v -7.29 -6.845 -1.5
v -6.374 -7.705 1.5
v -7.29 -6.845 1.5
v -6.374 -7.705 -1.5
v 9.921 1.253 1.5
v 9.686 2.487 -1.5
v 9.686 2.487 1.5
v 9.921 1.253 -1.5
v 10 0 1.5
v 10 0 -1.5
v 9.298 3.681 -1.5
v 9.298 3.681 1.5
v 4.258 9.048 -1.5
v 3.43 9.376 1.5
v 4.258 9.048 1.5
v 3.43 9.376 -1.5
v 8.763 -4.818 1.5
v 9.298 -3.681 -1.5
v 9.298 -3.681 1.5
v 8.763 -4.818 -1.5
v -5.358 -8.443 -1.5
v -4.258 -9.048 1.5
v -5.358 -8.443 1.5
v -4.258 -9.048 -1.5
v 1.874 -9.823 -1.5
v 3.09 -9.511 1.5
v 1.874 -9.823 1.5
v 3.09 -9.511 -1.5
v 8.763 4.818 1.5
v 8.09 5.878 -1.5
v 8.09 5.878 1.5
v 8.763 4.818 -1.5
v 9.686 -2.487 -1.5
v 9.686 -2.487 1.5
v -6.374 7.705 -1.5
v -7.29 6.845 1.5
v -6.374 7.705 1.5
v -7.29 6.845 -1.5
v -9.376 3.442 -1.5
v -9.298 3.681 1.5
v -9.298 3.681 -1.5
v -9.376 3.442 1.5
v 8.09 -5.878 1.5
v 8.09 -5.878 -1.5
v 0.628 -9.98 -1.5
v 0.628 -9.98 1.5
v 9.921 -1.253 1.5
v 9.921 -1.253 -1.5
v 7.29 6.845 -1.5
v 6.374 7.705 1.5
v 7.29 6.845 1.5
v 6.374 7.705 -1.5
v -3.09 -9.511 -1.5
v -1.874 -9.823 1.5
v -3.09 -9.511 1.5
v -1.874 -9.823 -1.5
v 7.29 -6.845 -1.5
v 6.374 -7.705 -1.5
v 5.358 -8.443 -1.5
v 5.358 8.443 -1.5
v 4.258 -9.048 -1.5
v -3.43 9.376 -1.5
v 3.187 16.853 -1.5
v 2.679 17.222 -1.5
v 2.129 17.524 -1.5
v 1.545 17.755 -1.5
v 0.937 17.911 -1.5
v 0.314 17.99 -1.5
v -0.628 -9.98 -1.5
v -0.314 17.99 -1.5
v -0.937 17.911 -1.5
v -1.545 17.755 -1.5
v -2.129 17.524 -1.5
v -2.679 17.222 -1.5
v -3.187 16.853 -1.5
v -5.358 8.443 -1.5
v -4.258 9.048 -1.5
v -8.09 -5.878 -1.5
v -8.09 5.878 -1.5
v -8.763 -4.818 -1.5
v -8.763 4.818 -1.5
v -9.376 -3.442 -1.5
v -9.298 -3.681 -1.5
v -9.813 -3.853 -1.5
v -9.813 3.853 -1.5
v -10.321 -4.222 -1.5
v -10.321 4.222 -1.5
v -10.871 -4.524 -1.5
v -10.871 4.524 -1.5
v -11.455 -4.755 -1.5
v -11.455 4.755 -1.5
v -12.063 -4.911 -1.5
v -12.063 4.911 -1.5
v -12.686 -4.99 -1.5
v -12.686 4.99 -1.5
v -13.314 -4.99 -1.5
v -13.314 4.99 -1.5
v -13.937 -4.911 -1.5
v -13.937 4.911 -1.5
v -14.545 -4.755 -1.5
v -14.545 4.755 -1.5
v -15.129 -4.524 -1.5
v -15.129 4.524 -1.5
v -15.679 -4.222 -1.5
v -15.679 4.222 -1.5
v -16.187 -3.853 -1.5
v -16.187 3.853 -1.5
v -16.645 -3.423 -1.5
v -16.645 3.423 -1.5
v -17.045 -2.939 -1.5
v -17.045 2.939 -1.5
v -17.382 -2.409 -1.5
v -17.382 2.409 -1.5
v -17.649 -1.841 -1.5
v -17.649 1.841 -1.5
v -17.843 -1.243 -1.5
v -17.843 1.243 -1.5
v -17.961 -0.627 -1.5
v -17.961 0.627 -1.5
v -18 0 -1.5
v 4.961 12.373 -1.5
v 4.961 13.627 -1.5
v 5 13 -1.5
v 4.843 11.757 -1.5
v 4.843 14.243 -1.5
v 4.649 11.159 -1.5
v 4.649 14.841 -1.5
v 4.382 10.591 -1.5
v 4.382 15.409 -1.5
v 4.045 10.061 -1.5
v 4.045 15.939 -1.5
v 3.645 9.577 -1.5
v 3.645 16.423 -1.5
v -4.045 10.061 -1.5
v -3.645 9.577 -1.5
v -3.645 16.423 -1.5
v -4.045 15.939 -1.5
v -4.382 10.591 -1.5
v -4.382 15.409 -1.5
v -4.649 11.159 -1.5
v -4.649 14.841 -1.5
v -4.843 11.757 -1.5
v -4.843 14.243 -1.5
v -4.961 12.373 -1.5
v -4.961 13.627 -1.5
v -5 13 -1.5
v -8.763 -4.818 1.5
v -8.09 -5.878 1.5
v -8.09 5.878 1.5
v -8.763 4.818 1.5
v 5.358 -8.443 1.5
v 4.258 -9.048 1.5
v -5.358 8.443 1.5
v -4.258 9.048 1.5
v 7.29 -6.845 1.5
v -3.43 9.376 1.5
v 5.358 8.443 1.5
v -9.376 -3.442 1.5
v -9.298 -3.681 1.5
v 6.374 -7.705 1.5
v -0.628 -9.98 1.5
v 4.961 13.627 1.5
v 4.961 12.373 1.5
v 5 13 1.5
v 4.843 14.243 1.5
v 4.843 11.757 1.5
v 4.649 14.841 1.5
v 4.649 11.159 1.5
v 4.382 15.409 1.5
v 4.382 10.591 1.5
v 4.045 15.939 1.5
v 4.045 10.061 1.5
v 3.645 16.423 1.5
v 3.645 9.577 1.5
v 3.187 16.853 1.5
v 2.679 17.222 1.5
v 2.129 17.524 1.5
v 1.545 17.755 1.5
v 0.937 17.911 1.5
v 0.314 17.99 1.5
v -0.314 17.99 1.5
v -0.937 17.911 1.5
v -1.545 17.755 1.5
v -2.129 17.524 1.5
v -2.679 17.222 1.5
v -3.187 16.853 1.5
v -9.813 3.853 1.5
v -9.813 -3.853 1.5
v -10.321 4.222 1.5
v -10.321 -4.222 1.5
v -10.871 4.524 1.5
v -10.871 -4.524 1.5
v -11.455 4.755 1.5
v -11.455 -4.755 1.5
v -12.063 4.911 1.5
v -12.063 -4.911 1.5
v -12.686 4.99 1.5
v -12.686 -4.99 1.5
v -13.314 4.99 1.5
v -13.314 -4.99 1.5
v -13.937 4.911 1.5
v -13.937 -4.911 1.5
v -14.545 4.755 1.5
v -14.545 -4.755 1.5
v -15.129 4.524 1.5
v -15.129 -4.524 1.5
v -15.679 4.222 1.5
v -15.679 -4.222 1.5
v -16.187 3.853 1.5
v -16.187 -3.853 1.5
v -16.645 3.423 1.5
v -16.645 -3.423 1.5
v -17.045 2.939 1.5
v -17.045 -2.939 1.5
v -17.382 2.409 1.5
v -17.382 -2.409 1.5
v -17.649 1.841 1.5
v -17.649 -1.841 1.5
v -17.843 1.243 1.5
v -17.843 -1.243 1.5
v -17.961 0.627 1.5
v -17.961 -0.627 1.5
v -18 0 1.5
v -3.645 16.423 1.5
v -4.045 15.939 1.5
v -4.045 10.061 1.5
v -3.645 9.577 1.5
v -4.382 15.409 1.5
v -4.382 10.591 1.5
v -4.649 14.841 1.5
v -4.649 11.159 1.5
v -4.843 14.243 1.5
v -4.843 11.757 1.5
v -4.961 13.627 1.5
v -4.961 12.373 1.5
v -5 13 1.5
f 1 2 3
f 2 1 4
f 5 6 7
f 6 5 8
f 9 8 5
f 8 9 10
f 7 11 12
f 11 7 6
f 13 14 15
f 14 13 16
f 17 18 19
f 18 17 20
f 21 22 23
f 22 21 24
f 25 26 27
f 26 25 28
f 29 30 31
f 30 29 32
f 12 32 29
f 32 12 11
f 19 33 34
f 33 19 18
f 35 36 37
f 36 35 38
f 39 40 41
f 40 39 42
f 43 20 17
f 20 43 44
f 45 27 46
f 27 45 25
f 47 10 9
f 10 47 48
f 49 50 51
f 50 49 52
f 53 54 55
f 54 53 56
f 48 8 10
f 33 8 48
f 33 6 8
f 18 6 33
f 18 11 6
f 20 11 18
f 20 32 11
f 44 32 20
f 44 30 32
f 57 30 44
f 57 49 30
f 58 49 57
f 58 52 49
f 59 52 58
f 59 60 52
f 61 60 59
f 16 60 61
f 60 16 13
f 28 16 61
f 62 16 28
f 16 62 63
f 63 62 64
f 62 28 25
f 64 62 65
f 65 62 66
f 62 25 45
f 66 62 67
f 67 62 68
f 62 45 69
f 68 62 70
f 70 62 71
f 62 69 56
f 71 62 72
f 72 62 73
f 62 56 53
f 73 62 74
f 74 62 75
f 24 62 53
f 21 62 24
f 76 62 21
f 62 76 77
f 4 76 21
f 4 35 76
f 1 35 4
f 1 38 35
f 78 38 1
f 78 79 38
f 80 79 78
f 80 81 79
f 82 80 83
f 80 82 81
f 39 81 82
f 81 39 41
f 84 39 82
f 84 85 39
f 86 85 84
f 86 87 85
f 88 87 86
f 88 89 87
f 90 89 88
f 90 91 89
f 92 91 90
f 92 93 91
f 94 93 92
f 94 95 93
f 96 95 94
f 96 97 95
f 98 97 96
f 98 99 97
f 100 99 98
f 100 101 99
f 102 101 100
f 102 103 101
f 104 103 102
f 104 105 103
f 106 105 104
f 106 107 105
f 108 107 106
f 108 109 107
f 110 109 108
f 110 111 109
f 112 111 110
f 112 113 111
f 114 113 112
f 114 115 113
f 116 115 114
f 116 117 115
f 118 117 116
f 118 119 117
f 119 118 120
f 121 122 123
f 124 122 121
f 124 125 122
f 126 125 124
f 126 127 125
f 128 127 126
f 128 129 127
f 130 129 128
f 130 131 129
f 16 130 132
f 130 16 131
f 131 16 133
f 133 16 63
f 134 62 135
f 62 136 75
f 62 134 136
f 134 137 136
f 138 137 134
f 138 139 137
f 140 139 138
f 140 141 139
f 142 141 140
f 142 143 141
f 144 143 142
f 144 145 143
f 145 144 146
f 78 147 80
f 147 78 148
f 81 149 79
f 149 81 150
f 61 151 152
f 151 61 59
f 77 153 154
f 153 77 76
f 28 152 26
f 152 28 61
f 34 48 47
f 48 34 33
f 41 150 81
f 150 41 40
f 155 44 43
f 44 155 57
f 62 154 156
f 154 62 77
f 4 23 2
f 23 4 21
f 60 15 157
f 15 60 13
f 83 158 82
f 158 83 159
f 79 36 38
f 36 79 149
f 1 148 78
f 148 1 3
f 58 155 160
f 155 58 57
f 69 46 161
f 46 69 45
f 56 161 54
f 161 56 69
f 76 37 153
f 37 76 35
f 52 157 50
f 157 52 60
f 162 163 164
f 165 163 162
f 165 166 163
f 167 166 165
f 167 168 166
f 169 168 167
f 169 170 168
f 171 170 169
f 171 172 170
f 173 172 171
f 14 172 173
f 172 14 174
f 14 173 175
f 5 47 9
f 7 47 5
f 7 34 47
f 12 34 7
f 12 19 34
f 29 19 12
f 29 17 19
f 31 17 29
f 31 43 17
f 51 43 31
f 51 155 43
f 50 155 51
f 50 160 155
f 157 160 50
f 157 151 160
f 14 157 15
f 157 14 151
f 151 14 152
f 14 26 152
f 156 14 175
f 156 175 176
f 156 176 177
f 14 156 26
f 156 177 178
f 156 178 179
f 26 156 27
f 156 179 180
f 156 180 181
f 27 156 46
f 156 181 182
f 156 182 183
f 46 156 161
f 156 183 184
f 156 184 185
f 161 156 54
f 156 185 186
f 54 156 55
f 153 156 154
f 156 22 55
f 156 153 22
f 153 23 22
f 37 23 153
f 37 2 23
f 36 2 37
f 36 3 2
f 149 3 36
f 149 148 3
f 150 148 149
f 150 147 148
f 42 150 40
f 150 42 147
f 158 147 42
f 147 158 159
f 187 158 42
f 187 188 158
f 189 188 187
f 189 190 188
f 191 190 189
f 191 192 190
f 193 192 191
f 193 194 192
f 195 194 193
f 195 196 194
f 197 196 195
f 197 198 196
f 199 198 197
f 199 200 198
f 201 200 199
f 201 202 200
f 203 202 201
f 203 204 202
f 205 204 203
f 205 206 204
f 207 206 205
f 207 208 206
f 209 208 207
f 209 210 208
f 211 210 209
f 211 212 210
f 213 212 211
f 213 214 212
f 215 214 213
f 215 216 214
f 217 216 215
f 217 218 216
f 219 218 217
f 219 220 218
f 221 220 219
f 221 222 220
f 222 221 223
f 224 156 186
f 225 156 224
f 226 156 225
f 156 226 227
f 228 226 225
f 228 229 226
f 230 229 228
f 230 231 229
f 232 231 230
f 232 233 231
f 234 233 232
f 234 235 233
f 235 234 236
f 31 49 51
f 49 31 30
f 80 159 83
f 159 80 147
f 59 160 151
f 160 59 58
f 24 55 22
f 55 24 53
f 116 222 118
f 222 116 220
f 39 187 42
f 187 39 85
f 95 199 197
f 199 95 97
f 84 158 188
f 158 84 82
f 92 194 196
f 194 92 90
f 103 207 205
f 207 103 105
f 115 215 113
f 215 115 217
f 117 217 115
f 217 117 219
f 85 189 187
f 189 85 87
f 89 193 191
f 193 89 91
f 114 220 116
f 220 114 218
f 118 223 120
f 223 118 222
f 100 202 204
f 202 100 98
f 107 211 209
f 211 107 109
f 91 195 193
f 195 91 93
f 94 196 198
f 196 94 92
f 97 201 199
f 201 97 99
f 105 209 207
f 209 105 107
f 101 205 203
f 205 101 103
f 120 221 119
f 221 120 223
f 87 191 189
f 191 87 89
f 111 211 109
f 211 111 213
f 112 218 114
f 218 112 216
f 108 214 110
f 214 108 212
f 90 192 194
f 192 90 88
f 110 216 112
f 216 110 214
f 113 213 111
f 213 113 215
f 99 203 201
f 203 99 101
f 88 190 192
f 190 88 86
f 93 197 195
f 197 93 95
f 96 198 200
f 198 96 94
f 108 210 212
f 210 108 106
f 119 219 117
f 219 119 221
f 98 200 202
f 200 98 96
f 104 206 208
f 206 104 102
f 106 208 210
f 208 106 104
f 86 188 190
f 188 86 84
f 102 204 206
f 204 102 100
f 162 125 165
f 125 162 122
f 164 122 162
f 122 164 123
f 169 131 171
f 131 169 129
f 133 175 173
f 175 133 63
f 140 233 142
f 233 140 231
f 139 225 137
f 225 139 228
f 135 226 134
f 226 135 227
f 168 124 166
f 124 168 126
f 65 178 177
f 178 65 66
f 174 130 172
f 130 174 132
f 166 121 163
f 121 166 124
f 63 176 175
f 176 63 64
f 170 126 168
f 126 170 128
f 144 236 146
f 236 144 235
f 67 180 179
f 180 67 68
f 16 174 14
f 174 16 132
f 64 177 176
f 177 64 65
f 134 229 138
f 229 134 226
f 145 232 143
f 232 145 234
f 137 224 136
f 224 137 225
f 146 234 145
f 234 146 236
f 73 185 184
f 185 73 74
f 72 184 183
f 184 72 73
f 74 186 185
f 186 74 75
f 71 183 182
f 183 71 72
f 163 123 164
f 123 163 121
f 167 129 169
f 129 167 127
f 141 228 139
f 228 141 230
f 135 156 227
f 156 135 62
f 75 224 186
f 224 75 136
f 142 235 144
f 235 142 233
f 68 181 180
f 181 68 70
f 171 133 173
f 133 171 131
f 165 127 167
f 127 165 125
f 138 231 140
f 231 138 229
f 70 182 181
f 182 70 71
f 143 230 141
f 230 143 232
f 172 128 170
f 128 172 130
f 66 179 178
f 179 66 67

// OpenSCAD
$fn=50;
union() {
  cylinder(r=10, h=3, center=true);
  translate([-13, 0, 0]) {
    cylinder(r=5, h=3, center=true);
  }
  translate([0, 13, 0]) {
    cylinder(r=5, h=3, center=true);
  }
}
